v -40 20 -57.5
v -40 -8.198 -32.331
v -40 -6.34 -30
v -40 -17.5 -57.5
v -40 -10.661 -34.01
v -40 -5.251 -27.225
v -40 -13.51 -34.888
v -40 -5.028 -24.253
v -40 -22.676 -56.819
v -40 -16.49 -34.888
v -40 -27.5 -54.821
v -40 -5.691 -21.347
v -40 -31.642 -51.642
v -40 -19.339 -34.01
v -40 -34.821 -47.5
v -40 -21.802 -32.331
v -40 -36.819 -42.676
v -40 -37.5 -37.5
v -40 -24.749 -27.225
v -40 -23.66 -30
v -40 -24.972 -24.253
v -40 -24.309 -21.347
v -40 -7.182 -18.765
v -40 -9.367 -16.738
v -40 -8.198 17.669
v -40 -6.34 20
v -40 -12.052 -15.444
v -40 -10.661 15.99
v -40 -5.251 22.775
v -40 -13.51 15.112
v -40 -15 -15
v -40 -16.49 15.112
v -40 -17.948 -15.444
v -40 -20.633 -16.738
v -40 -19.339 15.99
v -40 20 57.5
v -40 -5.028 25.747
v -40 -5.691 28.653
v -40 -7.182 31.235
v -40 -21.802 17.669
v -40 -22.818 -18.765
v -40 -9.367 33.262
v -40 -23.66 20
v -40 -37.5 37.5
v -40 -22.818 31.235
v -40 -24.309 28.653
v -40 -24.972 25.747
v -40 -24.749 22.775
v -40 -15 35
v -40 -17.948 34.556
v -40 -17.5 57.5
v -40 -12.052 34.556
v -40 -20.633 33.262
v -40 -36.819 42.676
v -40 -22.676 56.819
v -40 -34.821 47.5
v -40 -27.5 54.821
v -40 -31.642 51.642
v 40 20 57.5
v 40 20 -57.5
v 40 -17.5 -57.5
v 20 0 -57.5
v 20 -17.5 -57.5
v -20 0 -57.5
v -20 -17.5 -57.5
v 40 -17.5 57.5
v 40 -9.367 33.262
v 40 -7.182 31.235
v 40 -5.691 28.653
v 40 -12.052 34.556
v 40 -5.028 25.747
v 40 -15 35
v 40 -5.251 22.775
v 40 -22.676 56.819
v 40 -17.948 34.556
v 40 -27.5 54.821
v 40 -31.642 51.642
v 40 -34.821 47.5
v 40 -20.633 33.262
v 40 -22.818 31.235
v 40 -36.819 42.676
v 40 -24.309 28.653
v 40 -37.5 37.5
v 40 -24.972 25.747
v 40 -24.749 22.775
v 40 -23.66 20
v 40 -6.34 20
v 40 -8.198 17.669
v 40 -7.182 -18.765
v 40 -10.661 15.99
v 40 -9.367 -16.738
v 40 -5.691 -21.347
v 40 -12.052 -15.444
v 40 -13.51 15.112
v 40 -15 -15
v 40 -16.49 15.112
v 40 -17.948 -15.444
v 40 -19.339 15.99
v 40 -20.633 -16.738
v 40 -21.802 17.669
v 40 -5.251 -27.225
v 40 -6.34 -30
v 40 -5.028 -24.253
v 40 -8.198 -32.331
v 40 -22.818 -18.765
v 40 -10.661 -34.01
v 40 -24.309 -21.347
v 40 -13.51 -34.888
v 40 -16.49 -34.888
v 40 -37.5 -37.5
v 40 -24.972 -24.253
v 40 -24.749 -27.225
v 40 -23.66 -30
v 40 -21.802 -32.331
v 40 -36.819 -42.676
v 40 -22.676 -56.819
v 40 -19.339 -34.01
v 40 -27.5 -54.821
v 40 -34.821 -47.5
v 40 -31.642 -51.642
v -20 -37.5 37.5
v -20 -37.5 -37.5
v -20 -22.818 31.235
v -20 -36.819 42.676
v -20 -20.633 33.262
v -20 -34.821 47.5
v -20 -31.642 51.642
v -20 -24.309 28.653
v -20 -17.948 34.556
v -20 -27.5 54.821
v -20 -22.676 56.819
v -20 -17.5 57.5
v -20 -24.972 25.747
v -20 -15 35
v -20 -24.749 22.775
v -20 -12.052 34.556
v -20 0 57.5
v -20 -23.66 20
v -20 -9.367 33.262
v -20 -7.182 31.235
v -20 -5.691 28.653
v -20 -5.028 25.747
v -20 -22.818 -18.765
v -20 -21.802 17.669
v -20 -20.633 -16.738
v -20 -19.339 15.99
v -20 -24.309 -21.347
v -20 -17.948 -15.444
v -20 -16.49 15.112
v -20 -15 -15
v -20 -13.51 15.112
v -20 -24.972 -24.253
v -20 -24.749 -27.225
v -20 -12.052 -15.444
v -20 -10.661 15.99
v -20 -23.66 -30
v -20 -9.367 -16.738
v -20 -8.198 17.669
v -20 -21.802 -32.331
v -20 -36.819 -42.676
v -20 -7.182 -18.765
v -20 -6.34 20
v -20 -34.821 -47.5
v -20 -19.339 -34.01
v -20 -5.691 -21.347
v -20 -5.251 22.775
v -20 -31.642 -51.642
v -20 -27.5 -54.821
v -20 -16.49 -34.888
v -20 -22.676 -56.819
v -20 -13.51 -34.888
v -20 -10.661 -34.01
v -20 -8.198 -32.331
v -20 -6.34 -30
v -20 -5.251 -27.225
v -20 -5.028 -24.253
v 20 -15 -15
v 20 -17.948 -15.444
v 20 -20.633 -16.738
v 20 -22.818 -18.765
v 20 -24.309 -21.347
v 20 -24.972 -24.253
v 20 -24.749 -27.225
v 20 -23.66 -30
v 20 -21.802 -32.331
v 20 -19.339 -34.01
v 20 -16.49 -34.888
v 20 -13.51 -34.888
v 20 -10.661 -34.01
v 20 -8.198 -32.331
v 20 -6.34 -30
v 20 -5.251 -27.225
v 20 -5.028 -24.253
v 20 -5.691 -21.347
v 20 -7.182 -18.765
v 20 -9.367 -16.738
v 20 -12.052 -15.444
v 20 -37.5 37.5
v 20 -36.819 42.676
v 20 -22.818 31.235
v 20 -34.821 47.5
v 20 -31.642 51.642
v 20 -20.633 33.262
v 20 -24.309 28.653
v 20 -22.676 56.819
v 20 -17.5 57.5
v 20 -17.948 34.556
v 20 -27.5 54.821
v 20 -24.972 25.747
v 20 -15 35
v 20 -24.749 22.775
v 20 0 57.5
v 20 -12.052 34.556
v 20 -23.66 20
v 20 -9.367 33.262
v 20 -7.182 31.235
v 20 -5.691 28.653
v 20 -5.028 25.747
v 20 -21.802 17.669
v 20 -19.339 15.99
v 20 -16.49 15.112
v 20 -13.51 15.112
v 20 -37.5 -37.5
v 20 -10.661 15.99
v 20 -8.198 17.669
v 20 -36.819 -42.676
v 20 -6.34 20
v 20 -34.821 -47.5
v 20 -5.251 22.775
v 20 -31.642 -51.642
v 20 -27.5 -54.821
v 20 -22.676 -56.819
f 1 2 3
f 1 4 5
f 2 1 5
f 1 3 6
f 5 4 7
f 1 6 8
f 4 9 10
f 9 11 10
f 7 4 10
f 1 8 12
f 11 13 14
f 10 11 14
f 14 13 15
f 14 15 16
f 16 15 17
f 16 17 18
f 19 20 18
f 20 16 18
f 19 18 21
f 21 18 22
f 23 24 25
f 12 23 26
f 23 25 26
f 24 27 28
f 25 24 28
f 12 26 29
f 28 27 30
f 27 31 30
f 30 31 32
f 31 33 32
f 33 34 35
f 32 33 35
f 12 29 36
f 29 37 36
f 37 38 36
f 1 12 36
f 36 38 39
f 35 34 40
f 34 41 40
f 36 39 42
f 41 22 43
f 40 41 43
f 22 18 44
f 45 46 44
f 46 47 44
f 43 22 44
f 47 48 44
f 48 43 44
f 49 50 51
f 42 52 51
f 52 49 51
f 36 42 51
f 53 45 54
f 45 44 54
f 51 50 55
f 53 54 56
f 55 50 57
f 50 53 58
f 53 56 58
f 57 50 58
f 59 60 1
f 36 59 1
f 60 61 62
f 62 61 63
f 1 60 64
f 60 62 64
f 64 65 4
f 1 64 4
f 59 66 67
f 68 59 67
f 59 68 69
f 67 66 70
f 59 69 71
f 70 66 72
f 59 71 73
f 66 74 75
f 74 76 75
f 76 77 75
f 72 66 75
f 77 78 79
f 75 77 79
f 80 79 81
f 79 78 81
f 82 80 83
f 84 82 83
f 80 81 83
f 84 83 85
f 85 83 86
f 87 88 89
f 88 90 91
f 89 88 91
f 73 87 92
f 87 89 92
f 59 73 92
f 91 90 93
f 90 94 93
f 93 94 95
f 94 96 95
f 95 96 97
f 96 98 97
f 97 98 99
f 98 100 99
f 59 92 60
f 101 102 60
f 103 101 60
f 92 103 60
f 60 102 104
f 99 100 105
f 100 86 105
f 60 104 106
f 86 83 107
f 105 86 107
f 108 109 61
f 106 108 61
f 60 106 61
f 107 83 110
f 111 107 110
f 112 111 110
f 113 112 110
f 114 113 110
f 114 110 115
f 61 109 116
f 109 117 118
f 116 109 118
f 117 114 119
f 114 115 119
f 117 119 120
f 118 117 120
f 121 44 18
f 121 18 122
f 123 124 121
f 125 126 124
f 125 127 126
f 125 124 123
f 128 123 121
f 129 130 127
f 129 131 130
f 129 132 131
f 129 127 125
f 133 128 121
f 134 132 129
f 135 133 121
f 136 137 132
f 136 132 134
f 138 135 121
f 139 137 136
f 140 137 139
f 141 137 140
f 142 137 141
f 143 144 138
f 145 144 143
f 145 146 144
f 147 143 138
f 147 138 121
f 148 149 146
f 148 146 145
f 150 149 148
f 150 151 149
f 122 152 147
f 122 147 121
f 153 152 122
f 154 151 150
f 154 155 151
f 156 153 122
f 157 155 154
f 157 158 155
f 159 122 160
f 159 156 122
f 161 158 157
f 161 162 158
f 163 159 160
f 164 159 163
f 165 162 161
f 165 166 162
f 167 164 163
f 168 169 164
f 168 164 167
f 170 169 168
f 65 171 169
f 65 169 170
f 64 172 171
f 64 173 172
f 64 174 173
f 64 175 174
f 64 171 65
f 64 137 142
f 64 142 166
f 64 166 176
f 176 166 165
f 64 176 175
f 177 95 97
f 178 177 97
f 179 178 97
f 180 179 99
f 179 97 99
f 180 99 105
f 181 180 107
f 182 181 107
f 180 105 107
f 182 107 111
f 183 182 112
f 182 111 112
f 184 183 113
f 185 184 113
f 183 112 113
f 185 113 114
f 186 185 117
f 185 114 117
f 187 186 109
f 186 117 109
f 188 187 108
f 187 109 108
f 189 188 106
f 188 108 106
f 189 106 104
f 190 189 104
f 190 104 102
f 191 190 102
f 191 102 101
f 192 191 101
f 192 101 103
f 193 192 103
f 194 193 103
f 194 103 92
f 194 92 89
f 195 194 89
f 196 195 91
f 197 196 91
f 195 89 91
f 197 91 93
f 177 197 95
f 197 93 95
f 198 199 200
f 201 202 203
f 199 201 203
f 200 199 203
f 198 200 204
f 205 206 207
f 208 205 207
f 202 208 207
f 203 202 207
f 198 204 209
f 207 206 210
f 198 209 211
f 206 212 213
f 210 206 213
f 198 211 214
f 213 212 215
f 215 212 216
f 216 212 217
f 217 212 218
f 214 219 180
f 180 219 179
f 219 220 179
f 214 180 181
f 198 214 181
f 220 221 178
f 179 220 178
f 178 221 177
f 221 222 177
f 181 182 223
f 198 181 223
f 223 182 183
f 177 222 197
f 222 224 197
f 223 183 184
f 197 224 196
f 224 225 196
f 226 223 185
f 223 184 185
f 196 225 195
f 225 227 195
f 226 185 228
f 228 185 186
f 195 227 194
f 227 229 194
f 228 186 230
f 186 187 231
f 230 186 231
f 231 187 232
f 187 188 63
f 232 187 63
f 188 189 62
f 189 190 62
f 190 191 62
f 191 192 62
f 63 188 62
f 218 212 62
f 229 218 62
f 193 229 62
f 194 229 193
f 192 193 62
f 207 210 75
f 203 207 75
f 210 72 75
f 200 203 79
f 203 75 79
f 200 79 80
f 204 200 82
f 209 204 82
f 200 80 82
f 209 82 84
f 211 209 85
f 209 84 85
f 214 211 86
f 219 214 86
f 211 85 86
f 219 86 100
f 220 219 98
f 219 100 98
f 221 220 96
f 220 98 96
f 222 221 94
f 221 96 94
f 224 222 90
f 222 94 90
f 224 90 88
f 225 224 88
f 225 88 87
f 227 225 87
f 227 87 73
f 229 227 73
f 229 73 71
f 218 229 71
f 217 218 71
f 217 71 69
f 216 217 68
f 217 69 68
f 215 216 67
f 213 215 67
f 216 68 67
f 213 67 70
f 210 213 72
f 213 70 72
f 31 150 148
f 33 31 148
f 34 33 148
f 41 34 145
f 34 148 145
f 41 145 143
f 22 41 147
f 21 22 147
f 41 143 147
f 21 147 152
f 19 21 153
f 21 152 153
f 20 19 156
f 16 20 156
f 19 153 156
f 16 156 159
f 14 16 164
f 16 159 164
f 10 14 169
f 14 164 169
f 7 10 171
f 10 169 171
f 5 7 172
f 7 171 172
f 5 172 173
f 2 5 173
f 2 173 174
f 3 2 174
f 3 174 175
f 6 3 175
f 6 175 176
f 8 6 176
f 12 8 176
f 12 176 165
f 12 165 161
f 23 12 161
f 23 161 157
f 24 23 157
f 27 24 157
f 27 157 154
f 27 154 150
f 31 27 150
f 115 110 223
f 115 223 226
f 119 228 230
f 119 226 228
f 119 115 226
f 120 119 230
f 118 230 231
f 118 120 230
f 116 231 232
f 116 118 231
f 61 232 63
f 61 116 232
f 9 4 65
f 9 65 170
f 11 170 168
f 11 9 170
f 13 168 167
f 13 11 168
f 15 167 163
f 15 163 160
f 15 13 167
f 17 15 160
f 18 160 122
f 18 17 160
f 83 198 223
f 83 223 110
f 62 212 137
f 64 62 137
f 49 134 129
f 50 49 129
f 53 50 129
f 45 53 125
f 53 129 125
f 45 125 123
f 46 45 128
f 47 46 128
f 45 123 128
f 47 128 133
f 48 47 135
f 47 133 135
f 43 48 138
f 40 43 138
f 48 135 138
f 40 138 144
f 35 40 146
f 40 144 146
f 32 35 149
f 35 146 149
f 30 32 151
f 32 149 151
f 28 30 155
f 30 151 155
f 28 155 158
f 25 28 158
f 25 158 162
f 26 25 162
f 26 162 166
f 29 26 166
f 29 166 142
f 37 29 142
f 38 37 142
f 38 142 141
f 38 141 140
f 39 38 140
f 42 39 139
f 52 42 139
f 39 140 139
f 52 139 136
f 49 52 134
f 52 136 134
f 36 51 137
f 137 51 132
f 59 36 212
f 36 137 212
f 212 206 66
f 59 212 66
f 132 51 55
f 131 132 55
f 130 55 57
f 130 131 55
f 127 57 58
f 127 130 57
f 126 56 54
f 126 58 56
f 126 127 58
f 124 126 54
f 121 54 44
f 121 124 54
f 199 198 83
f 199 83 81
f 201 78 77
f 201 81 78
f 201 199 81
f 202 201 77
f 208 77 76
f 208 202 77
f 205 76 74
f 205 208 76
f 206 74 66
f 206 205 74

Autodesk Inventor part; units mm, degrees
ref_plane "YZ Plane" through (0, 0, 0) normal (1, 0, 0) x (0, 1, 0)
ref_plane "XZ Plane" through (0, 0, 0) normal (0, 1, 0) x (-1, 0, 0)
ref_plane "XY Plane" through (0, 0, 0) normal (0, 0, 1) x (1, 0, 0)
sketch "Sketch1" plane through (0, 0, 0) normal (0, 1, 0) x (-1, 0, 0)
  line L0 (40, 57.5) -> (-40, 57.5)
  line L1 (-40, 57.5) -> (-40, -57.5)
  line L2 (-40, -57.5) -> (40, -57.5)
  line L3 (40, -57.5) -> (40, 57.5)
  point P0 (0, 0)
  point P1 (40, 0)
  point P2 (0, 57.5)
  dimension "d0" = 115
  dimension "d1" = 80
extrude "Extrusion1" add sketch "Sketch1" along normal blind 20
sketch "Sketch12" plane through (0, 0, 0) normal (0, -1, 0) x (1, 0, 0)
  line L0 (-40, 57.5) -> (-20, 57.5)
  line L1 (-20, 57.5) -> (-20, -57.5)
  line L2 (-20, -57.5) -> (-40, -57.5)
  line L3 (-40, -57.5) -> (-40, 57.5)
  line L4 (-40, -57.5) -> (-40, 57.5) projected
  line L5 (0, 100.8809) -> (0, -116.5773) construction
  line L6 (40, 57.5) -> (20, 57.5)
  line L7 (20, 57.5) -> (20, -57.5)
  line L8 (20, -57.5) -> (40, -57.5)
  line L9 (40, -57.5) -> (40, 57.5)
  point P0 (0, 0)
  point P1 (-40, 0)
  point P2 (0, 0)
  point P3 (-20, 0)
  dimension "d56" = 20
  dimension "d57" = 115
extrude "Extrusion11" add sketch "Sketch12" along normal blind 37.5
sketch "Sketch13" plane through (-40, 0, 57.5) normal (-1, 0, 0) x (0, 0, 1)
  line L0 (0, 0) -> (-115, 0) projected
  point P0 (-57.5, 0)
  point P1 (-32.5, -15)
  point P2 (-82.5, -15)
  point P3 (-57.5, -15)
  point P4 (-57.5, 0)
  dimension "d129" = 25
  dimension "d130" = 25
  dimension "d131" = 15
hole "Hole2" at (-40, -15, 25) at (-40, -15, -25) direction (1, 0, 0) diameter 20 end through all
fillet "Fillet19" radius 20 4 edges at (-30, -37.5, -57.5) (30, -37.5, -57.5) (30, -37.5, 57.5) (-30, -37.5, 57.5)
properties part number "Y_Slider_Part_mit_Schrittmotor"
